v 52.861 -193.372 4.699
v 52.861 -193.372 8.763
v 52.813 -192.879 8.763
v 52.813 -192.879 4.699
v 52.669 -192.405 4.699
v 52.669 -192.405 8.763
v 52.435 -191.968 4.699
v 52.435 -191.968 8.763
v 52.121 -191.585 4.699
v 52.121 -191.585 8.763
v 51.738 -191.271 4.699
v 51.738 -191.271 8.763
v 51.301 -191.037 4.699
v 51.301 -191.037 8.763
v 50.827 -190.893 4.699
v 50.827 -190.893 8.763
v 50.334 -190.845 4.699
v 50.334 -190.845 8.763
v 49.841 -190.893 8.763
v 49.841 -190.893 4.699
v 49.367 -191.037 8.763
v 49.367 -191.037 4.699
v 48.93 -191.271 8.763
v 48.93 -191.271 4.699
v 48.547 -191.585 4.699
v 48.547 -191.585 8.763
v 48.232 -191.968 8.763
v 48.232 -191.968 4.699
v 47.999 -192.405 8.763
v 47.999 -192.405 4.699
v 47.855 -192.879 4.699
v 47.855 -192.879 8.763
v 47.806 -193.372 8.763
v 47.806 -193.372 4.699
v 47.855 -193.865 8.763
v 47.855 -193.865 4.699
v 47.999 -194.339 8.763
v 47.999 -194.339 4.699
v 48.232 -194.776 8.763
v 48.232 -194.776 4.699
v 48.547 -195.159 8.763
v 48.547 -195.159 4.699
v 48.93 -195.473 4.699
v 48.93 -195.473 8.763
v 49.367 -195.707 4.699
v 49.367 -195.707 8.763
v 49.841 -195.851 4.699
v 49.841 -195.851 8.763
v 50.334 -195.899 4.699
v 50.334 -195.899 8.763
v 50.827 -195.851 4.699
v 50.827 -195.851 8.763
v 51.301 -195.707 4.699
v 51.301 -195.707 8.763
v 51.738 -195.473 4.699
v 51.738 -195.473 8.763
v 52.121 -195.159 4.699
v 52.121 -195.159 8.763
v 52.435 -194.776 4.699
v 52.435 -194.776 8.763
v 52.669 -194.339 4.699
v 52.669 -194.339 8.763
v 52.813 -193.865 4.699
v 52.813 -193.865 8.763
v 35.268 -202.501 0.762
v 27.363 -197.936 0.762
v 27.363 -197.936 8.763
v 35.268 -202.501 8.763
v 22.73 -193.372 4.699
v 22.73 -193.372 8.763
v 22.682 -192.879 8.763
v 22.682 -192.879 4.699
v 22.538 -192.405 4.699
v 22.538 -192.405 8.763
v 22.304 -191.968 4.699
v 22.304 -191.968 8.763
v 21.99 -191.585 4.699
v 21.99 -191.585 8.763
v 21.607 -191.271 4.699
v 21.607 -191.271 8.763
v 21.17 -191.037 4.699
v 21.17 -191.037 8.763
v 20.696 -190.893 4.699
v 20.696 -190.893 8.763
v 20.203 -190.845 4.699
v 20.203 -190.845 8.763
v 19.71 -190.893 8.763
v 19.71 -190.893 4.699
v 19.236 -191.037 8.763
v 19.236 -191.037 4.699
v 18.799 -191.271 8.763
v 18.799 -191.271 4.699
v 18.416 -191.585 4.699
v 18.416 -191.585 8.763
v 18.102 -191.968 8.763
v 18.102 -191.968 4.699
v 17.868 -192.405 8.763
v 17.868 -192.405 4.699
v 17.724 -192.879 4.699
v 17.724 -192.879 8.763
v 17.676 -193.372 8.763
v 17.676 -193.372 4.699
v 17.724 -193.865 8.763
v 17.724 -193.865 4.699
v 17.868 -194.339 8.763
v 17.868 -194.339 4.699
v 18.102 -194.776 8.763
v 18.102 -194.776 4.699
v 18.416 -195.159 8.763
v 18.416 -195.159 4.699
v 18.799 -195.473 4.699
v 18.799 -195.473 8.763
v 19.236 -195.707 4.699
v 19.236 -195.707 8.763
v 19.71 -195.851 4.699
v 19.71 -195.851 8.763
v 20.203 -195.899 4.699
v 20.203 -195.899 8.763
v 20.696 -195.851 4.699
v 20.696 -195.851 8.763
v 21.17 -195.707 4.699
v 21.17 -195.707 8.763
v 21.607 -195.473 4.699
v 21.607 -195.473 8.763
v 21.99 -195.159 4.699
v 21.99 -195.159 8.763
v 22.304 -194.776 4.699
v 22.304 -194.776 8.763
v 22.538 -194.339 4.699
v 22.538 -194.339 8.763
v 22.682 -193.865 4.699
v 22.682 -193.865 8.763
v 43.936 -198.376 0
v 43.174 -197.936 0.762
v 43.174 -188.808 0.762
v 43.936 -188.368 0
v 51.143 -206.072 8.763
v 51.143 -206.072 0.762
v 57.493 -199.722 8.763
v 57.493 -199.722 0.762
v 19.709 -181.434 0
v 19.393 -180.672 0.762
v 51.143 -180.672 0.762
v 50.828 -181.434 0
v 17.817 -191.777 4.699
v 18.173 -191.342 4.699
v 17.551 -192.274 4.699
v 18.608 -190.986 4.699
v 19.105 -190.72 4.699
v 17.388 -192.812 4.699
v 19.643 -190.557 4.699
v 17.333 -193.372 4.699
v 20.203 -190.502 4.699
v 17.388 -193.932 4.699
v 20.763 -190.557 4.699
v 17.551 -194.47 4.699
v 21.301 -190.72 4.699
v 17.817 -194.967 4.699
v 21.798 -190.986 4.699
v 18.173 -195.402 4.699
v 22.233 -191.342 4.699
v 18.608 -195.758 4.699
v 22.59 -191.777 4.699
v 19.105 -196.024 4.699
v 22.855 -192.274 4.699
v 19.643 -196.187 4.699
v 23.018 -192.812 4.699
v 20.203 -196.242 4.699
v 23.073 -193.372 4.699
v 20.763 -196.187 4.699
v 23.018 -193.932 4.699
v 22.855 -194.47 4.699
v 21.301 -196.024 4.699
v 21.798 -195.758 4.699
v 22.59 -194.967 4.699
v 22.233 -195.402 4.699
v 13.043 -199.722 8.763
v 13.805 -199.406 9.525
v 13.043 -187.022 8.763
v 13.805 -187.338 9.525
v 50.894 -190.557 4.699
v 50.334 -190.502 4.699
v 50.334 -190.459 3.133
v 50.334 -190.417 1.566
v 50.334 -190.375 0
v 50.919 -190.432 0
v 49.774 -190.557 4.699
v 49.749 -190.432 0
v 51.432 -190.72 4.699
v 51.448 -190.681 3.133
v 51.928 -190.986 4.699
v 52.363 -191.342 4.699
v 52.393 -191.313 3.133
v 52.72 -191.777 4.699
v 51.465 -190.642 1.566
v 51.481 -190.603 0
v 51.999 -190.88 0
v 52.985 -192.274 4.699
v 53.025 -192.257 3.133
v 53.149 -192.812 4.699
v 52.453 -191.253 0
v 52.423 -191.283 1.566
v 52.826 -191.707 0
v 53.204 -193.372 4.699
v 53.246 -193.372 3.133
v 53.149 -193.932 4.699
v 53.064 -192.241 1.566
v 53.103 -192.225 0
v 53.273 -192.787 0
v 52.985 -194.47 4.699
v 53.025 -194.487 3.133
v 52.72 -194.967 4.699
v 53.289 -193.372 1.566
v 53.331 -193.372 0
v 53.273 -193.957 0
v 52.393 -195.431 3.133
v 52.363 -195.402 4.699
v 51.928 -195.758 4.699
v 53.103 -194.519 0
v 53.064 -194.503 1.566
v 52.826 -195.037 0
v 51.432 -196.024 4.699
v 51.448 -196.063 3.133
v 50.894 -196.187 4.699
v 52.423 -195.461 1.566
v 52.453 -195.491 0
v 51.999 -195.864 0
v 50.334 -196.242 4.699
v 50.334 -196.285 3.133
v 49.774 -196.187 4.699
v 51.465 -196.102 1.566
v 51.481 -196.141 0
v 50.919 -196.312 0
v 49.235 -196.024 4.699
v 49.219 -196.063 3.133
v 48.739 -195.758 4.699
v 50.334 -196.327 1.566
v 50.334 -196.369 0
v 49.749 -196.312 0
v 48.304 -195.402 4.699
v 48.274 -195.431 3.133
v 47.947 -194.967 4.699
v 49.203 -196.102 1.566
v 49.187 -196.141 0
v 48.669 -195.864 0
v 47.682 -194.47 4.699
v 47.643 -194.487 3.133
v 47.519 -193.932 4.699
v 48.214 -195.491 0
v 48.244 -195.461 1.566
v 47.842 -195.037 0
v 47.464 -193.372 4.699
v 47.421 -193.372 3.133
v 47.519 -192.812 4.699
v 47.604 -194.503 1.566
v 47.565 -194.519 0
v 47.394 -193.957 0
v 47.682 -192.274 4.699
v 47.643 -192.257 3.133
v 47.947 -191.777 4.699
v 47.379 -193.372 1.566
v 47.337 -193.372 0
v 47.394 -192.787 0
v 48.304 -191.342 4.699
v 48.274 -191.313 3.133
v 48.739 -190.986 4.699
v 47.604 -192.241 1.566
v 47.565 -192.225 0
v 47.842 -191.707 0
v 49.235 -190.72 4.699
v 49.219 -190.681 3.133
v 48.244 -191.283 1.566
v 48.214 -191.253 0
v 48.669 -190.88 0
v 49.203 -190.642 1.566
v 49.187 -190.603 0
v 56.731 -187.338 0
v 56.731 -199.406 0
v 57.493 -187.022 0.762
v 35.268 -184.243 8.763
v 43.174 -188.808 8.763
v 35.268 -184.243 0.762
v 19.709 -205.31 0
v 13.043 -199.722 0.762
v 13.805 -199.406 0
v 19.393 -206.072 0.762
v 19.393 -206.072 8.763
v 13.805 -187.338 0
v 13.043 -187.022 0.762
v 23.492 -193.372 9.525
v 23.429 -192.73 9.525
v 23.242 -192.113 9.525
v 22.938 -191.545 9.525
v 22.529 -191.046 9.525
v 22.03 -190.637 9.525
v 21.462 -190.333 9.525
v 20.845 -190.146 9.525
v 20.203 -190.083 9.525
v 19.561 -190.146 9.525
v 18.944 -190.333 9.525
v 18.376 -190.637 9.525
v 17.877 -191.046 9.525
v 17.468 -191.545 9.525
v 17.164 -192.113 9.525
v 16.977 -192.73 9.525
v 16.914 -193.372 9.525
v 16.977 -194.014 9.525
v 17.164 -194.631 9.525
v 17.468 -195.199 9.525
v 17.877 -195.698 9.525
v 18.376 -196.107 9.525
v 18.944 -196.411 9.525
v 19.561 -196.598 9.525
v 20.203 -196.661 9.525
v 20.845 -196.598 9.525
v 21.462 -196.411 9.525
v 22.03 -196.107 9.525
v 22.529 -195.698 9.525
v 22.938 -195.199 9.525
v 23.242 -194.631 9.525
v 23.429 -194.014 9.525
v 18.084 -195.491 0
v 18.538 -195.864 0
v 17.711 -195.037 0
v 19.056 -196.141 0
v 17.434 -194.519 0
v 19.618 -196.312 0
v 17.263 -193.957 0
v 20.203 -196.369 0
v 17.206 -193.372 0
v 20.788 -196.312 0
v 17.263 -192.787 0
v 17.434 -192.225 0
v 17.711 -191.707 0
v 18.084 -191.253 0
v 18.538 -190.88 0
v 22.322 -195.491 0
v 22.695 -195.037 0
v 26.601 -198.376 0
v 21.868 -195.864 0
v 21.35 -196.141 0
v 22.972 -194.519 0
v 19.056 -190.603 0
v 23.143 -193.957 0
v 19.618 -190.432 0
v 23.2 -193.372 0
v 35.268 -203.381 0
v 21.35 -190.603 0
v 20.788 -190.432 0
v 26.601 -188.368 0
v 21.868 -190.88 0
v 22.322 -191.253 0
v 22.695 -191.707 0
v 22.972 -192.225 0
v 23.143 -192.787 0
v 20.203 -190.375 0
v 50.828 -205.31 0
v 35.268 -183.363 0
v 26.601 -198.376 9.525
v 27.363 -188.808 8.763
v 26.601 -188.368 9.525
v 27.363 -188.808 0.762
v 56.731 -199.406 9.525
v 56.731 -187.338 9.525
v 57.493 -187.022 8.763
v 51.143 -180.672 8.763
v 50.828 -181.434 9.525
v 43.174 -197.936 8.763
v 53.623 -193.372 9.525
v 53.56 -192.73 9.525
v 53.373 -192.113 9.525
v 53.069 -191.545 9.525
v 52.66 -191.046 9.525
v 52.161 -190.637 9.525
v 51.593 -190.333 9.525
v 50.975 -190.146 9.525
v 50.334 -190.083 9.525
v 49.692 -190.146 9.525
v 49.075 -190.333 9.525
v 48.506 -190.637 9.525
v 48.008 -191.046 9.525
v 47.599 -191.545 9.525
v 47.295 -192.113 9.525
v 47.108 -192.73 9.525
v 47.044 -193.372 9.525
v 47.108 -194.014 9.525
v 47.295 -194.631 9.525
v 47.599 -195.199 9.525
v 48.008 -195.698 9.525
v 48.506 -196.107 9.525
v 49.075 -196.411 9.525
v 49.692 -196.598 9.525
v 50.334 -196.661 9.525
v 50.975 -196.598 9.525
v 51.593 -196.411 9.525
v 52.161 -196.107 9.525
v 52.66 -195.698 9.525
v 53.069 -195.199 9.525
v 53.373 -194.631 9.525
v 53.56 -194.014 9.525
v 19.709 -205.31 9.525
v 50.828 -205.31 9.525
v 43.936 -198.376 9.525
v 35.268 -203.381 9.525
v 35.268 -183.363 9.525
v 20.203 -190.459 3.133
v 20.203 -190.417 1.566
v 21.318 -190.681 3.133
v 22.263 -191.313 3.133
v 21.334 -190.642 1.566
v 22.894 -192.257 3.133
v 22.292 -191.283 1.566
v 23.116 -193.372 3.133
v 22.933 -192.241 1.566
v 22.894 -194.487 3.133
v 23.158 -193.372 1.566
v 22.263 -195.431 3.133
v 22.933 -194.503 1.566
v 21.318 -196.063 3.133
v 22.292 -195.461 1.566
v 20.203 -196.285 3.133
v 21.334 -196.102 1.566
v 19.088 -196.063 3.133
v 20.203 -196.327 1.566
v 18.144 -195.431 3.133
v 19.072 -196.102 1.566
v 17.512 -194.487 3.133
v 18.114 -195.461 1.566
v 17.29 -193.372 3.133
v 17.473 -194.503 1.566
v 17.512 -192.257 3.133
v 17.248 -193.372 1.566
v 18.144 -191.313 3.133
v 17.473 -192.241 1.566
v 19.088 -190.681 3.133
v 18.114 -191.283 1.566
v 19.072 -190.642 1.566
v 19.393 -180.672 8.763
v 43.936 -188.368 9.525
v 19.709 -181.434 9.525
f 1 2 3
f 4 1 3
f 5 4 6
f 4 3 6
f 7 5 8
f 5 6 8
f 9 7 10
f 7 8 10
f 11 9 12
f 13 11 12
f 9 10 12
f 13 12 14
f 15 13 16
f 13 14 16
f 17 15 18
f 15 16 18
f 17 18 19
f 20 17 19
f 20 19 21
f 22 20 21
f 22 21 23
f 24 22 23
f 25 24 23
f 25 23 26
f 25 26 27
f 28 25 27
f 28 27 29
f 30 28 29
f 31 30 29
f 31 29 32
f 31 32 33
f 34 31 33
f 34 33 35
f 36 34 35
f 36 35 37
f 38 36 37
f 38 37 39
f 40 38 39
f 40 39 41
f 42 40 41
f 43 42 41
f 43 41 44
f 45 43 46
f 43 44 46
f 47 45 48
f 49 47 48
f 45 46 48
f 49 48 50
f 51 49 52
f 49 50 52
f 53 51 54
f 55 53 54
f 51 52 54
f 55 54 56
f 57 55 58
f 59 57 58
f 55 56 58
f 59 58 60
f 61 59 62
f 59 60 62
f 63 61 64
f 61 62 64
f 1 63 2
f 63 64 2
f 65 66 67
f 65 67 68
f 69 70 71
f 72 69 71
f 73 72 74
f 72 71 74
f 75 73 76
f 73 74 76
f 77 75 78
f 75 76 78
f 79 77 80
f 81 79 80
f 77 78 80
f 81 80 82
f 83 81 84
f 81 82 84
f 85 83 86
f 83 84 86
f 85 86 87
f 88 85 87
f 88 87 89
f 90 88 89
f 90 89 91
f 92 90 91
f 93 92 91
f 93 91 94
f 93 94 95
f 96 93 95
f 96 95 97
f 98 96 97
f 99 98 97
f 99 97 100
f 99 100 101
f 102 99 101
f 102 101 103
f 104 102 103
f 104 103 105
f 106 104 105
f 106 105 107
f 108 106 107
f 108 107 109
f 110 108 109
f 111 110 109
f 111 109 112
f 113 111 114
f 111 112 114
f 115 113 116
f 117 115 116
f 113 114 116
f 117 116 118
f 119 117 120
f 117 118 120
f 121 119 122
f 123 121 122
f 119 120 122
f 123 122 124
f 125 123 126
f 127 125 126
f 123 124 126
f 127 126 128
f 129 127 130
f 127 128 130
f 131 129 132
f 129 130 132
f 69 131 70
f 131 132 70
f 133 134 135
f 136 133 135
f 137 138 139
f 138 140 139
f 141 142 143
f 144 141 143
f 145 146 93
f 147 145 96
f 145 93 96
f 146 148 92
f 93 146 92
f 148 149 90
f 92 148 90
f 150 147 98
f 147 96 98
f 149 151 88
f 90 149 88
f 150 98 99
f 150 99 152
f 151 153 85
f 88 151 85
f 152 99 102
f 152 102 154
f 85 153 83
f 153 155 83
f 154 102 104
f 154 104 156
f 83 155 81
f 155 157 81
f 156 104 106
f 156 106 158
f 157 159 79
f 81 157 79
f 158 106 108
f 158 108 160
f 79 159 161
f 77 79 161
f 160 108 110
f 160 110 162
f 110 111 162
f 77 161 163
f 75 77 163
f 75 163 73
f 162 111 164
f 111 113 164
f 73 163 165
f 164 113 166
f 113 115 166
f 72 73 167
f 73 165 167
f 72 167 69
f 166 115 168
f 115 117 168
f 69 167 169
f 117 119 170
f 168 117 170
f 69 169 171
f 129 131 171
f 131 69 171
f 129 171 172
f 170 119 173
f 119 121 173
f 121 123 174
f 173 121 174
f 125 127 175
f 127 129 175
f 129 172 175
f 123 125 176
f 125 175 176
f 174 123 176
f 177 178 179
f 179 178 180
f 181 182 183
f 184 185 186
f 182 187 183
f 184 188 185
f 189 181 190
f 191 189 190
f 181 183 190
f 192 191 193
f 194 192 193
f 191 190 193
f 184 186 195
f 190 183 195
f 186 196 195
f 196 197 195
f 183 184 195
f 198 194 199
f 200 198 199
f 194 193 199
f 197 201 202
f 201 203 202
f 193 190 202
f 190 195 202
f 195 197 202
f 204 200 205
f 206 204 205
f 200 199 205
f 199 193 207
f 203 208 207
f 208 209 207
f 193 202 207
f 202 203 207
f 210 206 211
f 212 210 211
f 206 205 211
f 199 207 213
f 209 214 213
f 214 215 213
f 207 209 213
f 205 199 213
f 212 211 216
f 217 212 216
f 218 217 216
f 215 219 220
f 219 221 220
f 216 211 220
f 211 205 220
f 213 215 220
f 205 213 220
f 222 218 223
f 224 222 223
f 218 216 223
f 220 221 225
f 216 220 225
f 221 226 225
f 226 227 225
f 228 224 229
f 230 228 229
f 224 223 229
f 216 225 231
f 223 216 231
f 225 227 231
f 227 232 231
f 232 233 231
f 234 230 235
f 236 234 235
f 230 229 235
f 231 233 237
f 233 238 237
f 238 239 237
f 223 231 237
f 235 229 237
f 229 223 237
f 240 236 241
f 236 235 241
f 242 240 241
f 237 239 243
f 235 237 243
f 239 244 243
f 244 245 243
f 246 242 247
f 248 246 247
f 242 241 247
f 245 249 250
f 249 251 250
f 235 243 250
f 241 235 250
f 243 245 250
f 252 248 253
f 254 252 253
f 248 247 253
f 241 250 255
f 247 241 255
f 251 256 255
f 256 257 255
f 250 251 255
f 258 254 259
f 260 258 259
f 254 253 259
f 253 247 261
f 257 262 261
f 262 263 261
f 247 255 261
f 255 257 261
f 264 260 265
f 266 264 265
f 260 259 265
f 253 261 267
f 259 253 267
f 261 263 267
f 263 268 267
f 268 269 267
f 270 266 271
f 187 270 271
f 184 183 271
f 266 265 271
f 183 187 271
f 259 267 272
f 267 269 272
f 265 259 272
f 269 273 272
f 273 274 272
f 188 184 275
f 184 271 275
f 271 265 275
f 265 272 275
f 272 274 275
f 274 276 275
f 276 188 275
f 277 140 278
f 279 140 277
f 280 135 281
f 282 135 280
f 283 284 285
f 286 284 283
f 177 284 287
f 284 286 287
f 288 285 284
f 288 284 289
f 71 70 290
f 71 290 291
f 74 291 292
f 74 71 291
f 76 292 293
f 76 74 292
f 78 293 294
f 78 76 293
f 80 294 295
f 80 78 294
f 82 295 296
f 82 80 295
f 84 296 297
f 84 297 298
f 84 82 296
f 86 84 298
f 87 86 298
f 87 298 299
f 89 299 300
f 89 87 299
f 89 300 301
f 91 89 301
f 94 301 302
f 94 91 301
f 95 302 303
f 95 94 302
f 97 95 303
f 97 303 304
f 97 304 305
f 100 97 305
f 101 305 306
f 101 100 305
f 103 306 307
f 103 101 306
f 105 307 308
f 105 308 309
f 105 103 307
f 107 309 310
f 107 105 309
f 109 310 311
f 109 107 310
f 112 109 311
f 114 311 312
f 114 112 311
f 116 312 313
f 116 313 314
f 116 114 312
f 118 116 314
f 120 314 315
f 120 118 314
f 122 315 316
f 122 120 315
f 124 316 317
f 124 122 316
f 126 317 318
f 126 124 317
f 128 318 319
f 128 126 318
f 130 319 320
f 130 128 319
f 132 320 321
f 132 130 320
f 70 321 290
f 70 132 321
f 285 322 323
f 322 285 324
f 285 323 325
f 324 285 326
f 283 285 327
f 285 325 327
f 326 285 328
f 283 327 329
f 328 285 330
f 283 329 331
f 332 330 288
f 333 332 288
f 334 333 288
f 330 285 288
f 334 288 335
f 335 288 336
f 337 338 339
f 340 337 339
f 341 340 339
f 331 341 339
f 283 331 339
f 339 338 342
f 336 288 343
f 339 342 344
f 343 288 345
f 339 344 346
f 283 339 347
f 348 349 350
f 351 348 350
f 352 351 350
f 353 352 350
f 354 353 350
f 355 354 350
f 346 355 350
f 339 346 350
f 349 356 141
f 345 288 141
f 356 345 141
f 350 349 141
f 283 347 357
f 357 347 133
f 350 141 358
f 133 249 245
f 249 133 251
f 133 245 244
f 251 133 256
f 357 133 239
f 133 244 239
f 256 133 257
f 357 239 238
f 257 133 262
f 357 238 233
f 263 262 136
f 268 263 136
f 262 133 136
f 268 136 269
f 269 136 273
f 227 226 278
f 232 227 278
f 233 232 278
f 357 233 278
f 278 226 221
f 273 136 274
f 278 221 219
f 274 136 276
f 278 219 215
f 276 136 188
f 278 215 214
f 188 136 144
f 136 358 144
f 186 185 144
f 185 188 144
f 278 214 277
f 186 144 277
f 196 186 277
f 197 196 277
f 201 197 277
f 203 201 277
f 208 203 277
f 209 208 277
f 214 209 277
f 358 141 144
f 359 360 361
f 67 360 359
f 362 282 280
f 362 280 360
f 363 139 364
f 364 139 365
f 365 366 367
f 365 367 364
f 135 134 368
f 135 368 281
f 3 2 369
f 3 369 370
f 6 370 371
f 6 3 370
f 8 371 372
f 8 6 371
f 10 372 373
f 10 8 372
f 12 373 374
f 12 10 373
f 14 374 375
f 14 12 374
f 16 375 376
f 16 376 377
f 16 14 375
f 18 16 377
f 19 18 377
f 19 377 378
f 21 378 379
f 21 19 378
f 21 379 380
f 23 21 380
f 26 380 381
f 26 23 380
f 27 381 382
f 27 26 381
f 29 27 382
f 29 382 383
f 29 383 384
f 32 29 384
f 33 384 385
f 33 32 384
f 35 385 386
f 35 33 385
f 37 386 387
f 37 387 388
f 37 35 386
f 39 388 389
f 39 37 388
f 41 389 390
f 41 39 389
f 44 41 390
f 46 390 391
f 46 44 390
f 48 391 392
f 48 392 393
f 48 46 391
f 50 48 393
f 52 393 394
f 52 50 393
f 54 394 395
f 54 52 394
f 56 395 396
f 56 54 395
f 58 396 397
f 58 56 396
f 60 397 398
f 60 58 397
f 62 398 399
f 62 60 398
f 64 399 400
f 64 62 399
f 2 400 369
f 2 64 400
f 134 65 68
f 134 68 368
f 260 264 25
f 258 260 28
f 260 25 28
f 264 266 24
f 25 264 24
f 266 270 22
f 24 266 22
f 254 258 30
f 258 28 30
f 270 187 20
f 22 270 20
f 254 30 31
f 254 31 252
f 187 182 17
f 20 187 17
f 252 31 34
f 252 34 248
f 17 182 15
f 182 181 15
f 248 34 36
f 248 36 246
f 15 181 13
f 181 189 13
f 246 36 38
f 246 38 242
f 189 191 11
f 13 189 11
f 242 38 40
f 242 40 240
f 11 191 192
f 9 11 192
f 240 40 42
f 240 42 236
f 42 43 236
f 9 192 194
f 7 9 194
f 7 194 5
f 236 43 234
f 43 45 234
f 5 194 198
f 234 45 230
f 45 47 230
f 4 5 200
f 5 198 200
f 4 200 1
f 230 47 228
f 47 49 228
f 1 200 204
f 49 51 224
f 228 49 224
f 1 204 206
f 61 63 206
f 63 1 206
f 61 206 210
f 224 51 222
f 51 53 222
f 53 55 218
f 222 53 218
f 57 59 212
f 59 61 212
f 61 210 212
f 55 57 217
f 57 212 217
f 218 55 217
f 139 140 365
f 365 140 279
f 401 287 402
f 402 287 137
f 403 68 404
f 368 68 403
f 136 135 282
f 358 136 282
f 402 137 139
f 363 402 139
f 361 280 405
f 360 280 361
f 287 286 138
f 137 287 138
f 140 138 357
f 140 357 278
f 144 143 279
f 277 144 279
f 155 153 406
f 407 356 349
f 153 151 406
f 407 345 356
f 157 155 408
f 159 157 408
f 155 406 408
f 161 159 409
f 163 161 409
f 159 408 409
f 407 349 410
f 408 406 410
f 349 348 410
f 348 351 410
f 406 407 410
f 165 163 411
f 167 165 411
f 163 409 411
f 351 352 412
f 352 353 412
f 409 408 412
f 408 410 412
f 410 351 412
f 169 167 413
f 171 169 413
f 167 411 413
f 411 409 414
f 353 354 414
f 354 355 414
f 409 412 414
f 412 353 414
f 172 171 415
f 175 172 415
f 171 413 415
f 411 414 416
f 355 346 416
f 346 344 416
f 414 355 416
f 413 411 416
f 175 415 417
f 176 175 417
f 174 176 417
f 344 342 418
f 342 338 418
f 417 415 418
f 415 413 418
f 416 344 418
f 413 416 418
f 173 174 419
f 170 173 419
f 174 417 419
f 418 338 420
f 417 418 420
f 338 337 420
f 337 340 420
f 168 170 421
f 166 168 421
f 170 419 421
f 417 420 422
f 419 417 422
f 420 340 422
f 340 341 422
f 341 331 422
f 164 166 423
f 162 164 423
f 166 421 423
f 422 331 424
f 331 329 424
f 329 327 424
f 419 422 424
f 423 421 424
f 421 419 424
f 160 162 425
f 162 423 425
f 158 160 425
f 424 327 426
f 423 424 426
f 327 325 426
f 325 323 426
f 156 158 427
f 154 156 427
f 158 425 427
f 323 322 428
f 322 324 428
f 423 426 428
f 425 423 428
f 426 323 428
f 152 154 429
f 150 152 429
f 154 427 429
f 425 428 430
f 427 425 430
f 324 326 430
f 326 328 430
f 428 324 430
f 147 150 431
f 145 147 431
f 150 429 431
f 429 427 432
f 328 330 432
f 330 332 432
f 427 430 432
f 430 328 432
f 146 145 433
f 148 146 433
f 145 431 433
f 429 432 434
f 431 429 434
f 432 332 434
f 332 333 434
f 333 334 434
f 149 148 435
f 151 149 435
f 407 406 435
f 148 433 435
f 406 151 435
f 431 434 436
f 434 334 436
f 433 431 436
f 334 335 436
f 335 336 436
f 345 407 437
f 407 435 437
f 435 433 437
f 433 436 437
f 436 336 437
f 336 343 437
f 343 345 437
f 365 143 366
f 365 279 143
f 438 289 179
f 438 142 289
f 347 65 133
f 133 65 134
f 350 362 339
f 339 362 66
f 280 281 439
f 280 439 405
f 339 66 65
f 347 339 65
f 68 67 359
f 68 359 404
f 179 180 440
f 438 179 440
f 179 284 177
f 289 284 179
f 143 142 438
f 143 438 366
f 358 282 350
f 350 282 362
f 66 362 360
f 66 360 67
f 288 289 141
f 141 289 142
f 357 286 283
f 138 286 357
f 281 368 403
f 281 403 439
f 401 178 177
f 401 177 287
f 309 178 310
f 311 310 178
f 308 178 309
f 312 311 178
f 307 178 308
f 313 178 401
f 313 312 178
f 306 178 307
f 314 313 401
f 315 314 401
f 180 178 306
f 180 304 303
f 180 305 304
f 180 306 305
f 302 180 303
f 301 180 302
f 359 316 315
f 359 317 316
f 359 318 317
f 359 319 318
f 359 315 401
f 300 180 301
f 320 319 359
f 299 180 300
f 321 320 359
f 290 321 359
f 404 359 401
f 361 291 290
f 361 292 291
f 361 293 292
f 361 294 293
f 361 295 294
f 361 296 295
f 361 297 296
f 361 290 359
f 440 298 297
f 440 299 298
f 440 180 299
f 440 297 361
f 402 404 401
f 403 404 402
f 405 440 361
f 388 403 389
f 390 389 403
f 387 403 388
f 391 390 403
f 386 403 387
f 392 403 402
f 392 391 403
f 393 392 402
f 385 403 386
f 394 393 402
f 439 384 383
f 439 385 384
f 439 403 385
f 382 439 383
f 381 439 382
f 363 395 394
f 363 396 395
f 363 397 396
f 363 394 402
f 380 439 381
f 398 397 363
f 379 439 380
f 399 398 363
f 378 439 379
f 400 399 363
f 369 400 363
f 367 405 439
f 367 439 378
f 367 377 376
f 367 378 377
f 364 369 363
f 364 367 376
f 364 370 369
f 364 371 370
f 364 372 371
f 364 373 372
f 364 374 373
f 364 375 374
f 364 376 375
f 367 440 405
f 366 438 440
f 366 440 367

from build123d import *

# Parameters (mm, degrees)
SKETCH1_W                  = 44.45
SKETCH1_H                  = 25.4
BOSS_EXTRUDE1_DEPTH        = 9.525
CHAMFER1_SIZE              = 6.35
HOLE1_AT_2_COUNT           = 2
HOLE1_AT_2_PITCH           = 30.13075
F_8_0_199_DIAMETER_HOLE1_D = 5.0546
CHAMFER2_SIZE              = 0.762


with BuildPart() as part:
    # Sketch1 → Boss-Extrude1 (new body)
    with BuildSketch(Plane.XY):
        with Locations((35.268404938, -193.371995598)):
            Rectangle(SKETCH1_W, SKETCH1_H)
        Polygon((43.174154938, -197.936382488), (43.174154938, -188.807608707), (35.268404938, -184.243221816), (27.362654938, -188.807608707), (27.362654938, -197.936382488), (35.268404938, -202.500769379), align=None, mode=Mode.SUBTRACT)
    extrude(amount=BOSS_EXTRUDE1_DEPTH)

    # Chamfer1
    chamfer1_edges = [part.edges().sort_by_distance(p)[0] for p in [
        (13.043404938, -180.671995598, 4.7625),
        (57.493404938, -180.671995598, 4.7625),
        (57.493404938, -206.071995598, 4.7625),
        (13.043404938, -206.071995598, 4.7625),
    ]]
    chamfer(chamfer1_edges, length=CHAMFER1_SIZE)

    # Sketch3 → Hole1 (revolve, cut)
    with BuildSketch(Plane(origin=(20.203029938, -193.371995598, 0), x_dir=(0, 1, 0), z_dir=(1, 0, 0))):
        Polygon((0, 0), (0, 4.699), (2.8702, 4.699), (2.9972, 0), align=None)
    hole1 = revolve(axis=Axis((20.203029938, -193.371995598, 110), (0, 0, -1)), mode=Mode.SUBTRACT)

    # Hole1 at 2: Hole1 ×2
    with Locations(*[(i * HOLE1_AT_2_PITCH, 0, 0) for i in range(1, HOLE1_AT_2_COUNT)]):
        add(hole1, mode=Mode.SUBTRACT)

    # #8 (0.199) Diameter Hole1 (through all)
    with Locations(Plane(origin=(0, 0, 0), x_dir=(-1, 0, 0), z_dir=(0, 0, -1))):
        with Locations((-50.333779938, -193.371995598), (-20.203029938, -193.371995598)):
            Hole(F_8_0_199_DIAMETER_HOLE1_D / 2)

    # Chamfer2
    chamfer2_edges = [part.edges().sort_by_distance(p)[0] for p in [
        (39.221279938, -200.218575934, 0),
        (43.174154938, -193.371995598, 0),
        (39.221279938, -186.525415262, 0),
        (31.315529938, -186.525415262, 0),
        (27.362654938, -193.371995598, 0),
        (31.315529938, -200.218575934, 0),
        (39.221279938, -200.218575934, 9.525),
        (43.174154938, -193.371995598, 9.525),
        (39.221279938, -186.525415262, 9.525),
        (31.315529938, -186.525415262, 9.525),
        (27.362654938, -193.371995598, 9.525),
        (31.315529938, -200.218575934, 9.525),
        (35.268404938, -180.671995598, 0),
        (35.268404938, -180.671995598, 9.525),
        (13.043404938, -193.371995598, 0),
        (57.493404938, -193.371995598, 0),
        (35.268404938, -206.071995598, 0),
        (16.218404938, -183.846995598, 0),
        (16.218404938, -202.896995598, 0),
        (54.318404938, -202.896995598, 0),
        (54.318404938, -183.846995598, 0),
        (57.493404938, -193.371995598, 9.525),
        (13.043404938, -193.371995598, 9.525),
        (35.268404938, -206.071995598, 9.525),
        (16.218404938, -183.846995598, 9.525),
        (16.218404938, -202.896995598, 9.525),
        (54.318404938, -202.896995598, 9.525),
        (54.318404938, -183.846995598, 9.525),
        (17.675729938, -193.371995598, 9.525),
        (47.806479938, -193.371995598, 9.525),
    ]]
    chamfer(chamfer2_edges, length=CHAMFER2_SIZE)


solid = part.part
